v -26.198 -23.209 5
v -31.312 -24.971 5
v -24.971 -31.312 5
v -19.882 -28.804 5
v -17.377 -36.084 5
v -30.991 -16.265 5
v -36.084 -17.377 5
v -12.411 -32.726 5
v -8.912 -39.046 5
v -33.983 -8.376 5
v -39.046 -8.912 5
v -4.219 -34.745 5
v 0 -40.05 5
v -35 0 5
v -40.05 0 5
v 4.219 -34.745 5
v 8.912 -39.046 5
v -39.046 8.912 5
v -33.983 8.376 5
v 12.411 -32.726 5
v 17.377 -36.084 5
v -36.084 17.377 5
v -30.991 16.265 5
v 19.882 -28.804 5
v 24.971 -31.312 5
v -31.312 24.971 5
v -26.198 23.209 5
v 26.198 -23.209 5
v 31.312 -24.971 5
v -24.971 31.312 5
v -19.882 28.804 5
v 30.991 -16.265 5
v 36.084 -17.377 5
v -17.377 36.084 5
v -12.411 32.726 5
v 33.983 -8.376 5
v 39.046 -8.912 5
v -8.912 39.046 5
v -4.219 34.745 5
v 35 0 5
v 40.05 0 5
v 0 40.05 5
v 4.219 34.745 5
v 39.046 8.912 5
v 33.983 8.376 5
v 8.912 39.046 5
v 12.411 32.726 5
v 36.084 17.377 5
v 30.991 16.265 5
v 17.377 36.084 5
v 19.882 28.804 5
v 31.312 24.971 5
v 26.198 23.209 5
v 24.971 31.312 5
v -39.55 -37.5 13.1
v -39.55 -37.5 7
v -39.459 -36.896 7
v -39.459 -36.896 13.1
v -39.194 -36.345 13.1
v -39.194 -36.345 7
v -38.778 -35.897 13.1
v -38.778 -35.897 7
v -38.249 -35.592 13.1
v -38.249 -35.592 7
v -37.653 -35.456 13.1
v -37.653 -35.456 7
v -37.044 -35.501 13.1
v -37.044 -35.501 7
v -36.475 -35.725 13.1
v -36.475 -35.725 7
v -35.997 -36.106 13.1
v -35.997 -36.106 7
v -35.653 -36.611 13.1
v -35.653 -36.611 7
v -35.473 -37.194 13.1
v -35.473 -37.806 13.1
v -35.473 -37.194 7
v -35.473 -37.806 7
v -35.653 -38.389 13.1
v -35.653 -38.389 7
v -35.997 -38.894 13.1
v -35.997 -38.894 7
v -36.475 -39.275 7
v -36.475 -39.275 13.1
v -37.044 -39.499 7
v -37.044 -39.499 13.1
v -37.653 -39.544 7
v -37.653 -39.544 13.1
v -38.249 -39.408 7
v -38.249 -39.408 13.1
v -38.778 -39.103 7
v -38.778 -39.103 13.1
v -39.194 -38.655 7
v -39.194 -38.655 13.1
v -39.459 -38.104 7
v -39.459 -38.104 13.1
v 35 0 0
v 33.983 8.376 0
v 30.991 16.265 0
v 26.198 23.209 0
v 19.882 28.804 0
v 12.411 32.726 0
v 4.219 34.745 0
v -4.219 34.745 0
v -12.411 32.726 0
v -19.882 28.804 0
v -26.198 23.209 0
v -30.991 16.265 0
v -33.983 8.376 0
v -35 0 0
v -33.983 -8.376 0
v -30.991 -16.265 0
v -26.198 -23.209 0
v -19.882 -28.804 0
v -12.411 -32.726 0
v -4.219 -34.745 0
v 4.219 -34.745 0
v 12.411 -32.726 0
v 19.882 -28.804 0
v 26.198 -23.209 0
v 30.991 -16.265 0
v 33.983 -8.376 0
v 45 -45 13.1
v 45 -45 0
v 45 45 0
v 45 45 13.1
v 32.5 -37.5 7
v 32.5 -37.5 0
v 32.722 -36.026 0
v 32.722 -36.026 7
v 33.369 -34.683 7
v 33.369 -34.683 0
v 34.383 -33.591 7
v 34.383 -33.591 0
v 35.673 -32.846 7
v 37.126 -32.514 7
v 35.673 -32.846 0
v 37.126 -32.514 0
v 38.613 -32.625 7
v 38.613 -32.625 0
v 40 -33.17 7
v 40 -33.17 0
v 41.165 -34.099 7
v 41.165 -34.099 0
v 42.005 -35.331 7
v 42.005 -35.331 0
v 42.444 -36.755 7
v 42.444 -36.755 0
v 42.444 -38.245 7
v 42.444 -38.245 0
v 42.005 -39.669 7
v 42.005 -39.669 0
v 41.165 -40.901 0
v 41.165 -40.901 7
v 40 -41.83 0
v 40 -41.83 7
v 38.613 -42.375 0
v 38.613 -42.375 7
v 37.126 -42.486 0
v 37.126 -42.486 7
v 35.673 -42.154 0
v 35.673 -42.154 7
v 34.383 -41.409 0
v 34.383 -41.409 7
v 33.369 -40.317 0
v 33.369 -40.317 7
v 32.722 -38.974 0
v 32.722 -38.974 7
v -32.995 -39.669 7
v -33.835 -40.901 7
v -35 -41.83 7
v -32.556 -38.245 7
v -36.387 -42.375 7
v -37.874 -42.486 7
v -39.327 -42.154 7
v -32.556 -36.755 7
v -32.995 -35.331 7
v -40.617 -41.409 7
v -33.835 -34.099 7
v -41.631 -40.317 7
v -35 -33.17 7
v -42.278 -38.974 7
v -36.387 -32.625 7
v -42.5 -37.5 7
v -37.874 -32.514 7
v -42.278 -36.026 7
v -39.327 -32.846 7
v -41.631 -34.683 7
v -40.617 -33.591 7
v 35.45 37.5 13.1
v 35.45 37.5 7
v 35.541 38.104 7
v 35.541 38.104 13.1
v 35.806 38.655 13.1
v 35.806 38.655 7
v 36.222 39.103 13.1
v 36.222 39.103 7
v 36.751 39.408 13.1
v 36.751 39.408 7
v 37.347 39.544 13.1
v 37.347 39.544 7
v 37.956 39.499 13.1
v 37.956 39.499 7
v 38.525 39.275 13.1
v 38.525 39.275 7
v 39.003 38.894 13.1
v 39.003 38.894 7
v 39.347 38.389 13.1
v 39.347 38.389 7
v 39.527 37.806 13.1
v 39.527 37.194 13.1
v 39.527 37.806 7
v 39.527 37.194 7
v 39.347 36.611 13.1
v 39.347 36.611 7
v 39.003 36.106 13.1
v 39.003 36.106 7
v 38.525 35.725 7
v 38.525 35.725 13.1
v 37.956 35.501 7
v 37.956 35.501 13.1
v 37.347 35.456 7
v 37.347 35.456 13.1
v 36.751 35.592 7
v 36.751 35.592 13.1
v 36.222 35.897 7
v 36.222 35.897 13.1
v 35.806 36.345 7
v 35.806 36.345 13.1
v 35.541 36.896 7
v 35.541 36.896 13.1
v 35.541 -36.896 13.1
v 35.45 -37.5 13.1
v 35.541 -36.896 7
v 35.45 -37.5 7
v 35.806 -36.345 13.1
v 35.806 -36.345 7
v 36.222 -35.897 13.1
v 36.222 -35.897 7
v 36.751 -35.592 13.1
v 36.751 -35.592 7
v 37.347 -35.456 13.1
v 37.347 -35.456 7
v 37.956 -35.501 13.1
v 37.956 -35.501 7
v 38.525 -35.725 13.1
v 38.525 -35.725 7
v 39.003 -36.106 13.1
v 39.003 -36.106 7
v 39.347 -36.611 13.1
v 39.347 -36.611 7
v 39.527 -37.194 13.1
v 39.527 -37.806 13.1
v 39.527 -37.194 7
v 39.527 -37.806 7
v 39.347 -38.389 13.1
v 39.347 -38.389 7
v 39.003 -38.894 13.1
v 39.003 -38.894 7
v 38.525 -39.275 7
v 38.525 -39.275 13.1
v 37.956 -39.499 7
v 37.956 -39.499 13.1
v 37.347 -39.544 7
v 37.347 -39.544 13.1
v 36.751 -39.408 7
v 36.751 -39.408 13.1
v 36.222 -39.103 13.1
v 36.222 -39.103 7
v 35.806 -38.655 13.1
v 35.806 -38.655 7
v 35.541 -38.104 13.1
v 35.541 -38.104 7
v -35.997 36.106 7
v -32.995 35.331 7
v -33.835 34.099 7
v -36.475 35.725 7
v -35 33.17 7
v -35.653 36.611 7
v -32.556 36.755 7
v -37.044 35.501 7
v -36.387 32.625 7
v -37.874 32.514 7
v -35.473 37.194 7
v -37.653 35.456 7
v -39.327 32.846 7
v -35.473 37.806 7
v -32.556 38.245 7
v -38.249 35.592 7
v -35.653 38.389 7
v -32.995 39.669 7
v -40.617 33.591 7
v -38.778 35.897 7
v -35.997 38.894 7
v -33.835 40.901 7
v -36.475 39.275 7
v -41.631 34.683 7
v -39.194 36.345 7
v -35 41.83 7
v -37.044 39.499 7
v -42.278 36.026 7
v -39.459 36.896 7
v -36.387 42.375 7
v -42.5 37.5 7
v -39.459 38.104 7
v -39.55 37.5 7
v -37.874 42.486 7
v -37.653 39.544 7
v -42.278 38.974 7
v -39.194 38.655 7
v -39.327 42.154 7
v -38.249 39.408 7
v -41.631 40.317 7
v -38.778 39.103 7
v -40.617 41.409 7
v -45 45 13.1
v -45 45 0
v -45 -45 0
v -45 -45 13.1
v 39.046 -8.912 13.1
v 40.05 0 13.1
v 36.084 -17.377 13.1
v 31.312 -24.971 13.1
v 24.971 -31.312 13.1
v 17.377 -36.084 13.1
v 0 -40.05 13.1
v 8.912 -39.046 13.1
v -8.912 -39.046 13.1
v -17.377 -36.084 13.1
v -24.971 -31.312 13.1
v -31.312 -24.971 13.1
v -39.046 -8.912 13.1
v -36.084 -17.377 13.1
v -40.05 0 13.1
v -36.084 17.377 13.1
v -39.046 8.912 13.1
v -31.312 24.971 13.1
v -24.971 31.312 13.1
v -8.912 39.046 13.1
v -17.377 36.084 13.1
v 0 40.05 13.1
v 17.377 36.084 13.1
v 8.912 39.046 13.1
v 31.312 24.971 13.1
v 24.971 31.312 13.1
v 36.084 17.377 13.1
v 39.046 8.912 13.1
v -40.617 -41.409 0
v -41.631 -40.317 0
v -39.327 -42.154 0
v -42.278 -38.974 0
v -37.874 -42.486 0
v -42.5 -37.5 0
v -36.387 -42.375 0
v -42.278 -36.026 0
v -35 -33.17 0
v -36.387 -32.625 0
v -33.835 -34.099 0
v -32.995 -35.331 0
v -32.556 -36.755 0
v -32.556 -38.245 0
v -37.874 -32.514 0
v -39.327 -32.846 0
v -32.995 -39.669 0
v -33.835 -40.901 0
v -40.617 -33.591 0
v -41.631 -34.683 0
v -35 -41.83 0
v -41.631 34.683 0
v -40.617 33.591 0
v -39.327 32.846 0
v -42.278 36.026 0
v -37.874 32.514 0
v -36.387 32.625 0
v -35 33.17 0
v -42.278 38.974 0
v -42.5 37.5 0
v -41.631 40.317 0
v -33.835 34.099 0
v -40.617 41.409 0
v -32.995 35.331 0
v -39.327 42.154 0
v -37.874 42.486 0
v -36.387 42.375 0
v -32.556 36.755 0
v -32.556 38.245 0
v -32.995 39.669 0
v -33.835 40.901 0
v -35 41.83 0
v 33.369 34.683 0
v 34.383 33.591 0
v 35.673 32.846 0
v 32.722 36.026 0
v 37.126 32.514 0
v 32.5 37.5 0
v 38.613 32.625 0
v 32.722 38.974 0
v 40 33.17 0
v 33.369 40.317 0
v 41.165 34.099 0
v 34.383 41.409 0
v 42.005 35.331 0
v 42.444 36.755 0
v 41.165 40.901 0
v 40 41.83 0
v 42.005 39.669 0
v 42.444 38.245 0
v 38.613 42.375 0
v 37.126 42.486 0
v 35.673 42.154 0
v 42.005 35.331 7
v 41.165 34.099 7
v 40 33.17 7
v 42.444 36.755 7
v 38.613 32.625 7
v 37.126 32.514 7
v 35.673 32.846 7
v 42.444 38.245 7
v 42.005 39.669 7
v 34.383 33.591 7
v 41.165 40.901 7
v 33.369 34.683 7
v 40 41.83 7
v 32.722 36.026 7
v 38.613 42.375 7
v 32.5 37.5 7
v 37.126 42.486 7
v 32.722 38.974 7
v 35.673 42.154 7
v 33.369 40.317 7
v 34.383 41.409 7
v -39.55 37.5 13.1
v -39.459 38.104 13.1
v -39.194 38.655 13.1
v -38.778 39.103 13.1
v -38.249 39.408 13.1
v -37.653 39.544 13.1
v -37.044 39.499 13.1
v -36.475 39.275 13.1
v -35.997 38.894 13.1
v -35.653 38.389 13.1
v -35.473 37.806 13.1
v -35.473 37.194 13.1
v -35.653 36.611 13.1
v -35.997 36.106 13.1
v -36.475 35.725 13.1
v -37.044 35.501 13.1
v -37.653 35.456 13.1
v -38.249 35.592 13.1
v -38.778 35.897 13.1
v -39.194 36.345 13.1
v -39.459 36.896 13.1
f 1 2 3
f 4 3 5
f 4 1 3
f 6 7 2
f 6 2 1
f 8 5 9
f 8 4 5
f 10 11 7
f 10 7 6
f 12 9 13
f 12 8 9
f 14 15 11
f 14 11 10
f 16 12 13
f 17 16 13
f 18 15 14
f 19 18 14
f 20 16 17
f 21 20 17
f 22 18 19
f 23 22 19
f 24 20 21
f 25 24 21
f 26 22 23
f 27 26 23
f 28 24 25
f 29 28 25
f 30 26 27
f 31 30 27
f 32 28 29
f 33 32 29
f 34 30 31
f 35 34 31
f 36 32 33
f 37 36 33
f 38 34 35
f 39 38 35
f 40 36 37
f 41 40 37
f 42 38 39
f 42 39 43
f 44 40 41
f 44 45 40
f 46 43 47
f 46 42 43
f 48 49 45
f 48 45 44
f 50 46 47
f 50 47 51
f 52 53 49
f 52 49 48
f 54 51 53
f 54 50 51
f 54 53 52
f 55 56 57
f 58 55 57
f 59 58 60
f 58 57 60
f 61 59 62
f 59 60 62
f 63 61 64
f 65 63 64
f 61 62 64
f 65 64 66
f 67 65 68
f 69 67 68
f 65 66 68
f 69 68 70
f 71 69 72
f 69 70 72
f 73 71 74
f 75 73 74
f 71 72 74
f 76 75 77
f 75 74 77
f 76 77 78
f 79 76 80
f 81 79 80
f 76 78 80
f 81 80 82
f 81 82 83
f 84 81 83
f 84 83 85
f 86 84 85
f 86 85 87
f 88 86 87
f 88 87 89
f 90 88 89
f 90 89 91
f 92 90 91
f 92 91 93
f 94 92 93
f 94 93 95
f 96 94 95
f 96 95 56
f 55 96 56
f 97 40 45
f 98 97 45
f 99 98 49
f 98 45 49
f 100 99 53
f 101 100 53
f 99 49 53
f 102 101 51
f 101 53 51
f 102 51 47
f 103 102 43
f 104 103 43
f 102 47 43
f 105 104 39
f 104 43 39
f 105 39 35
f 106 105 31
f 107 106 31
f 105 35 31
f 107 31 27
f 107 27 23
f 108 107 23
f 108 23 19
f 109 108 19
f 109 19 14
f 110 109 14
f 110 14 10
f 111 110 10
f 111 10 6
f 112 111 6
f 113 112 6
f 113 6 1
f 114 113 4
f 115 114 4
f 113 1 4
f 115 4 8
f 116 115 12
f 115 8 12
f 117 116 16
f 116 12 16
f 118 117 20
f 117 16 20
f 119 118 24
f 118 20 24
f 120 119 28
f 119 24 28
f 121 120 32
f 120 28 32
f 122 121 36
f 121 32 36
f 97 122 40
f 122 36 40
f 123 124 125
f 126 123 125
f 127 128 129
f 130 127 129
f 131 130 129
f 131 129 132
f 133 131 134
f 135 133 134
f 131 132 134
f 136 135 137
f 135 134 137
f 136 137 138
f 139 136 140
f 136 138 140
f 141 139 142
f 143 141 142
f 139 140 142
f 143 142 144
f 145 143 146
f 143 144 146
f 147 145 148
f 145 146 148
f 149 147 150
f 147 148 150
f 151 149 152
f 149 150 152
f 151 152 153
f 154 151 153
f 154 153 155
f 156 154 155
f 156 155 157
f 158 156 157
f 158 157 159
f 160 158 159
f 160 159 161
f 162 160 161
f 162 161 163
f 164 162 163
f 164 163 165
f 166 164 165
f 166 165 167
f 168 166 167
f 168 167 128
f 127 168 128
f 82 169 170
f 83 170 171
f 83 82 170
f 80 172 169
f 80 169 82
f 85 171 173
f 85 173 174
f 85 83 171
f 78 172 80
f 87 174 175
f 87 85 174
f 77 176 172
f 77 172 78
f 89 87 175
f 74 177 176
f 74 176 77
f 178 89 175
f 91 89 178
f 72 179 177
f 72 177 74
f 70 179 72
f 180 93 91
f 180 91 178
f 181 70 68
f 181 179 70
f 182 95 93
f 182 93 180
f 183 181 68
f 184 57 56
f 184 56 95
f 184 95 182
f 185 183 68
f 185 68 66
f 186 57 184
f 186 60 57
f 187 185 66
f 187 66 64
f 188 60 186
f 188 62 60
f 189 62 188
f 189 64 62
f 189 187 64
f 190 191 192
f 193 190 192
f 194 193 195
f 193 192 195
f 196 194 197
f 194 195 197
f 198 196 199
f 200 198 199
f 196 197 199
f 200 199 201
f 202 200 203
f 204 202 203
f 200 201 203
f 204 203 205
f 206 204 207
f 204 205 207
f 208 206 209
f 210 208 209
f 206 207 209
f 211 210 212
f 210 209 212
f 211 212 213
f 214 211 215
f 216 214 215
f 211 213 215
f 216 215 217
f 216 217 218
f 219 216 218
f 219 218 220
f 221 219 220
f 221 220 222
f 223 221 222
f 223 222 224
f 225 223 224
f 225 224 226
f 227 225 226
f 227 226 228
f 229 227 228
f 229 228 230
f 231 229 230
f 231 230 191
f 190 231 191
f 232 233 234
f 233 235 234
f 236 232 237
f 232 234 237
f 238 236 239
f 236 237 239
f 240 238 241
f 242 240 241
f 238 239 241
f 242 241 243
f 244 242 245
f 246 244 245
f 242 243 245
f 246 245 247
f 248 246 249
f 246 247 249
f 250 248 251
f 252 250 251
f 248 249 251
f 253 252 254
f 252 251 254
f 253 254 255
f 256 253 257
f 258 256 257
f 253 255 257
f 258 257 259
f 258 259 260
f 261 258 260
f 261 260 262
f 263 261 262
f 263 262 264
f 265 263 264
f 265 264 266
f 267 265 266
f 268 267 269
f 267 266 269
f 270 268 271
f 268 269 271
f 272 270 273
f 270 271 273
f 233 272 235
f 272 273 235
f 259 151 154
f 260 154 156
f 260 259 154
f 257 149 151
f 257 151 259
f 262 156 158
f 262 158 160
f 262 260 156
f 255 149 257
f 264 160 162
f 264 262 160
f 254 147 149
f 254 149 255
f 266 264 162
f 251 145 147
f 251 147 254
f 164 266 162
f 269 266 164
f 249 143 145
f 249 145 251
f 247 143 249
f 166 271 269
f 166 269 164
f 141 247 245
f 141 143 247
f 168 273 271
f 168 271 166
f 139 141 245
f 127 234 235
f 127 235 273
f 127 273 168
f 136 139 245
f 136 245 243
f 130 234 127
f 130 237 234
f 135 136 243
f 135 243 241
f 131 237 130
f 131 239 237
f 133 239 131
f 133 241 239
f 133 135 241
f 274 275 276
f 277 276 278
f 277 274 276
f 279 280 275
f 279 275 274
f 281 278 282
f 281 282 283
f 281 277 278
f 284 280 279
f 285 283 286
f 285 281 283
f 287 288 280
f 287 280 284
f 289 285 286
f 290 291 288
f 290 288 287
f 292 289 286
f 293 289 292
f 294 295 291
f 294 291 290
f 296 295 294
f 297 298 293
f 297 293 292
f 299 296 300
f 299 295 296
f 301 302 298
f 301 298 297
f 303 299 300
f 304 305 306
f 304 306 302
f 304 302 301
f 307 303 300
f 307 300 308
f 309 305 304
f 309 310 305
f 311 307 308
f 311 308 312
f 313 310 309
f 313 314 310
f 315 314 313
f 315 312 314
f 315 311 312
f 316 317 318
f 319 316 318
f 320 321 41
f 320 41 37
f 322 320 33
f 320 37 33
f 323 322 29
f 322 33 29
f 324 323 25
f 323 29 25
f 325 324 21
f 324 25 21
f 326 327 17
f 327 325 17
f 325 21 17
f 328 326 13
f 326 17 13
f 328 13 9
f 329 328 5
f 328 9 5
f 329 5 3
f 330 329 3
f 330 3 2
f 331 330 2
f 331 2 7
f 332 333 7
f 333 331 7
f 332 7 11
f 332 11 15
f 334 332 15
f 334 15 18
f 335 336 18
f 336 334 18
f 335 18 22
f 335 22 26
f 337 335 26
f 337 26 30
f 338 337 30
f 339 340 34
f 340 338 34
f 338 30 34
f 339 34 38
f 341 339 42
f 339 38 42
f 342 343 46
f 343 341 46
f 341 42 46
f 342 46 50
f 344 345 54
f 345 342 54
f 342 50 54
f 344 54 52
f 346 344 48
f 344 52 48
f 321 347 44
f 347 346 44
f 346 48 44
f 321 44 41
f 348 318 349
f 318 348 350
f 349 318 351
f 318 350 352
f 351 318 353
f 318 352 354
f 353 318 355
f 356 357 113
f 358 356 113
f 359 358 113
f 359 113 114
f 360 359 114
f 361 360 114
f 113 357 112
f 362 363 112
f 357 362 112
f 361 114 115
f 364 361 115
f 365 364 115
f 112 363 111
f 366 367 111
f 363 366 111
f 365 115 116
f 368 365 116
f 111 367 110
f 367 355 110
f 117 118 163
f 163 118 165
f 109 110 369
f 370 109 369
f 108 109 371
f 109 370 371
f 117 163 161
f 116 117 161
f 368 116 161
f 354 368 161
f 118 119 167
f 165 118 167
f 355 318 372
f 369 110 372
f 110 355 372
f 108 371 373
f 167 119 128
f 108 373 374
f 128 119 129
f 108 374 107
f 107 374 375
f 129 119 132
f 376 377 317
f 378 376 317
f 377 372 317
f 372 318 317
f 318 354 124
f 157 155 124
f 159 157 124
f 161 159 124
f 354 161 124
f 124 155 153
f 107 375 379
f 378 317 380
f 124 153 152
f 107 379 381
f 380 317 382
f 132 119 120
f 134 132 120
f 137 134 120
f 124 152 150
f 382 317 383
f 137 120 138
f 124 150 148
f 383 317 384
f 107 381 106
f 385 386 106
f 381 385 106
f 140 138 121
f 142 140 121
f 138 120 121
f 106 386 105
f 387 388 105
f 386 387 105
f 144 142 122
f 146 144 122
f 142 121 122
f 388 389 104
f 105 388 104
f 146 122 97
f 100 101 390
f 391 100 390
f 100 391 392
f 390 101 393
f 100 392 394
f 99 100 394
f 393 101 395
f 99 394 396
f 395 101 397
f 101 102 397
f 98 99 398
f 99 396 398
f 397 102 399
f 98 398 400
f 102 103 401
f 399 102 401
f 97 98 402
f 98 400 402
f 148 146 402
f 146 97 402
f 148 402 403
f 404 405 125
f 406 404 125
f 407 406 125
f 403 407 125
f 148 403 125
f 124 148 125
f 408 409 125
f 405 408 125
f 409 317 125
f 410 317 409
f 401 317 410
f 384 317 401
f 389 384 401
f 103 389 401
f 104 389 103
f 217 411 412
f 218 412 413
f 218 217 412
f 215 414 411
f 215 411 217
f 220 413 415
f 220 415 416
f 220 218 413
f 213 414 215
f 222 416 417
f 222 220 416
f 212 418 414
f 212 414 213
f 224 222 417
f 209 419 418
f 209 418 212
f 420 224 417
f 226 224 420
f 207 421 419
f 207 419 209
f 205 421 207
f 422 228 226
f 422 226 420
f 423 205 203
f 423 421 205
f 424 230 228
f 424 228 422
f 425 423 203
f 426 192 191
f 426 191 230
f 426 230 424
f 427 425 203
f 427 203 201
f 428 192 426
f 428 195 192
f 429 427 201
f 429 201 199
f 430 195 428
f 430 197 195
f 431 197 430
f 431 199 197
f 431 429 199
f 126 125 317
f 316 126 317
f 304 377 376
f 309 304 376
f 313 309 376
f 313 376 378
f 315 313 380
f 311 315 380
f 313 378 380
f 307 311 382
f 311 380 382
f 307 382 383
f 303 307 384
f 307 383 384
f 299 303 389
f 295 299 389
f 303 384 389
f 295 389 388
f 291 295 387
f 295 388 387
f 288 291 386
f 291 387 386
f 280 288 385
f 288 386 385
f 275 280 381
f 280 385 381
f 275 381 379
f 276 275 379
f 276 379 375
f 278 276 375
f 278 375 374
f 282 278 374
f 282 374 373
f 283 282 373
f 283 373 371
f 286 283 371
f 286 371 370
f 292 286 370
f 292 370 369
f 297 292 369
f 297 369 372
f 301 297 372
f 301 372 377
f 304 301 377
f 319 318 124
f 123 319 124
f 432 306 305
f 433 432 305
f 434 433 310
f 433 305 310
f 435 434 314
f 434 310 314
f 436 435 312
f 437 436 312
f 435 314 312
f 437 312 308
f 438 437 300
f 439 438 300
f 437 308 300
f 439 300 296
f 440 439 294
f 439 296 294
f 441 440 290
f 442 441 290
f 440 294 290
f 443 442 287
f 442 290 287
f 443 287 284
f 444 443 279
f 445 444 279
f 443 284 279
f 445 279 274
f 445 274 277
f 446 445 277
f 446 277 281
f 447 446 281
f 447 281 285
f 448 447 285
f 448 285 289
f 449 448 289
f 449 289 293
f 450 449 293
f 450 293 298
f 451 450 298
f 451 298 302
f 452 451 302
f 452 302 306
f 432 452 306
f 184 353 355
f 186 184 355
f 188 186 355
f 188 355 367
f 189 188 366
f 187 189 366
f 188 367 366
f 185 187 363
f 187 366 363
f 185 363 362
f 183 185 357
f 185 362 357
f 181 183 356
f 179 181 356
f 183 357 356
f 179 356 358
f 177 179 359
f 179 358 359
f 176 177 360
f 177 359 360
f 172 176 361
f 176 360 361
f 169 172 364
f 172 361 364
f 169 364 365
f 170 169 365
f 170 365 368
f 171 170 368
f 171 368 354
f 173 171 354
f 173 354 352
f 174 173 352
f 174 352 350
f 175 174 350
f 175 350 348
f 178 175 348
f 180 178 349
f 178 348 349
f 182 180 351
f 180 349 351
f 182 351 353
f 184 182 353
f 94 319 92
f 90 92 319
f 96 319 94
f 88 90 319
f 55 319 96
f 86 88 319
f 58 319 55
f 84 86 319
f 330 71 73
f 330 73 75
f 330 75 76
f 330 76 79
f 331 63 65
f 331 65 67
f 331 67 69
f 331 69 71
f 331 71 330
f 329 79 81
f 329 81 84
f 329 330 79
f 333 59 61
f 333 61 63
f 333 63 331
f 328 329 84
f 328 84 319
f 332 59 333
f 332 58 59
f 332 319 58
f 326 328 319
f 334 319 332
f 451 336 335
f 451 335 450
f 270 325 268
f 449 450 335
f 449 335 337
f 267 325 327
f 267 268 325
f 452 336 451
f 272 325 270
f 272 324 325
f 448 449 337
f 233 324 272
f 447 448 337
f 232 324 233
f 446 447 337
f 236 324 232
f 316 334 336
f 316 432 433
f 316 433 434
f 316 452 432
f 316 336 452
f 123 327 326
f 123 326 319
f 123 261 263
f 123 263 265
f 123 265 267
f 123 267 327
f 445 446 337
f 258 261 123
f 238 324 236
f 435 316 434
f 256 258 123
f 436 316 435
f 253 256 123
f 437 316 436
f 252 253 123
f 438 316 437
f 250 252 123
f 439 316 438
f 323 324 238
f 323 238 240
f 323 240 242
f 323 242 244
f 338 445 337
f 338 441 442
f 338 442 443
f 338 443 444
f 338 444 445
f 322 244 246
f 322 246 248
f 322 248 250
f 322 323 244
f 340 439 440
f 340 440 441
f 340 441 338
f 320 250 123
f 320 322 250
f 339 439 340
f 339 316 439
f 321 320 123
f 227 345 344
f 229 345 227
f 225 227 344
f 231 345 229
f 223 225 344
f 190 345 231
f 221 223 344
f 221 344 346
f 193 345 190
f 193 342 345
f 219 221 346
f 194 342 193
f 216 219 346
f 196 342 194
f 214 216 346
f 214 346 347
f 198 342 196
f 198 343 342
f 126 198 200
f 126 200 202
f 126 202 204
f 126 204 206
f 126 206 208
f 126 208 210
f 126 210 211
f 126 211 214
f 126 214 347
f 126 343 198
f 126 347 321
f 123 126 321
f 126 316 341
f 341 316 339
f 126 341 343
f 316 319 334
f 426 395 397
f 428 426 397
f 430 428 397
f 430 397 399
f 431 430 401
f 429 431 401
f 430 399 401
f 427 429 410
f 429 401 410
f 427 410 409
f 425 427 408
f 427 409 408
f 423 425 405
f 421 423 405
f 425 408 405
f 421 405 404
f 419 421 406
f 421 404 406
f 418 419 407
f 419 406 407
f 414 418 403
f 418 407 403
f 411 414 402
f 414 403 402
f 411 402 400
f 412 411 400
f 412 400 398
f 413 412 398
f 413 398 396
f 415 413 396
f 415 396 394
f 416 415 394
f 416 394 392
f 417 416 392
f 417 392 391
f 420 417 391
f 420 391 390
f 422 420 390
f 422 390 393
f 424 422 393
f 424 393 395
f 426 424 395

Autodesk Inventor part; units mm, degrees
ref_plane "YZ Plane" through (0, 0, 0) normal (1, 0, 0) x (0, 1, 0)
ref_plane "XZ Plane" through (0, 0, 0) normal (0, 1, 0) x (-1, 0, 0)
ref_plane "XY Plane" through (0, 0, 0) normal (0, 0, 1) x (1, 0, 0)
sketch "Sketch4" plane through (0, 0, 0) normal (0, 0, 1) x (1, 0, 0)
  line L0 (-45, -45) -> (45, -45)
  line L1 (45, -45) -> (45, 45)
  line L2 (45, 45) -> (-45, 45)
  line L3 (-45, 45) -> (-45, -45)
  line L4 (-45, -45) -> (45, 45) construction
  line L5 (45, -45) -> (-45, 45) construction
  point P0 (0, 0)
  dimension "d10" = 90
  dimension "d11" = 90
extrude "Extrusion4" add sketch "Sketch4" along normal blind 5
sketch "Sketch5" plane through (0, 0, 5) normal (0, 0, 1) x (1, 0, 0)
  line L0 (-45, -45) -> (45, -45)
  line L1 (45, -45) -> (45, 45)
  line L2 (45, 45) -> (-45, 45)
  line L3 (-45, 45) -> (-45, -45)
  line L4 (-45, -45) -> (45, 45) construction
  line L5 (45, -45) -> (-45, 45) construction
  line L6 (45, 45) -> (-45, 45) projected
  line L7 (45, -45) -> (45, 45) projected
  circle A0 centre (0, 0) radius 40.05
  dimension "d14" = 80.1
extrude "Extrusion5" add sketch "Sketch5" along normal blind 8.1
sketch "Sketch6" plane through (0, 0, 5) normal (0, 0, 1) x (1, 0, 0)
  circle A0 centre (0, 0) radius 35
  dimension "d17" = 70
extrude "Extrusion6" cut sketch "Sketch6" against normal through all
sketch "Sketch7" plane through (0, 0, 0) normal (0, 0, -1) x (-1, 0, 0)
  circle A0 centre (-37.5, -37.5) radius 2.05
  circle A1 centre (-37.5, 37.5) radius 2.05
  circle A2 centre (37.5, 37.5) radius 2.05
  circle A3 centre (37.5, -37.5) radius 2.05
  line L0 (-45, -45) -> (-45, 45) projected
  line L1 (45, -45) -> (-45, -45) projected
  line L2 (-45, 45) -> (45, 45) projected
  line L3 (45, 45) -> (45, -45) projected
  point P0 (0, 0)
  dimension "d20" = 4.1
  dimension "d21" = 4.1
  dimension "d22" = 4.1
  dimension "d23" = 4.1
  dimension "d24" = 7.5
  dimension "d25" = 7.5
  dimension "d26" = 7.5
  dimension "d27" = 7.5
  dimension "d28" = 7.5
  dimension "d29" = 7.5
  dimension "d30" = 7.5
  dimension "d31" = 7.5
extrude "Extrusion7" cut sketch "Sketch7" against normal through all contours A0 | A1 | A2 | A3
sketch "Sketch8" plane through (0, 0, 0) normal (0, 0, -1) x (-1, 0, 0)
  circle A0 centre (-37.5, -37.5) radius 2.05 projected
  circle A1 centre (-37.5, 37.5) radius 2.05 projected
  circle A2 centre (37.5, 37.5) radius 2.05 projected
  circle A3 centre (37.5, -37.5) radius 2.05 projected
  circle A4 centre (-37.5, -37.5) radius 5
  circle A5 centre (-37.5, 37.5) radius 5
  circle A6 centre (37.5, 37.5) radius 5
  circle A7 centre (37.5, -37.5) radius 5
  point P0 (0, 0)
  dimension "d34" = 10
  dimension "d35" = 10
  dimension "d36" = 10
  dimension "d37" = 10
extrude "Extrusion8" cut sketch "Sketch8" against normal blind 7 contours A1 | A2 | A4 | A5 | A6 | A7
properties part number "bearing_bracket1" material "ABS Plastic"
